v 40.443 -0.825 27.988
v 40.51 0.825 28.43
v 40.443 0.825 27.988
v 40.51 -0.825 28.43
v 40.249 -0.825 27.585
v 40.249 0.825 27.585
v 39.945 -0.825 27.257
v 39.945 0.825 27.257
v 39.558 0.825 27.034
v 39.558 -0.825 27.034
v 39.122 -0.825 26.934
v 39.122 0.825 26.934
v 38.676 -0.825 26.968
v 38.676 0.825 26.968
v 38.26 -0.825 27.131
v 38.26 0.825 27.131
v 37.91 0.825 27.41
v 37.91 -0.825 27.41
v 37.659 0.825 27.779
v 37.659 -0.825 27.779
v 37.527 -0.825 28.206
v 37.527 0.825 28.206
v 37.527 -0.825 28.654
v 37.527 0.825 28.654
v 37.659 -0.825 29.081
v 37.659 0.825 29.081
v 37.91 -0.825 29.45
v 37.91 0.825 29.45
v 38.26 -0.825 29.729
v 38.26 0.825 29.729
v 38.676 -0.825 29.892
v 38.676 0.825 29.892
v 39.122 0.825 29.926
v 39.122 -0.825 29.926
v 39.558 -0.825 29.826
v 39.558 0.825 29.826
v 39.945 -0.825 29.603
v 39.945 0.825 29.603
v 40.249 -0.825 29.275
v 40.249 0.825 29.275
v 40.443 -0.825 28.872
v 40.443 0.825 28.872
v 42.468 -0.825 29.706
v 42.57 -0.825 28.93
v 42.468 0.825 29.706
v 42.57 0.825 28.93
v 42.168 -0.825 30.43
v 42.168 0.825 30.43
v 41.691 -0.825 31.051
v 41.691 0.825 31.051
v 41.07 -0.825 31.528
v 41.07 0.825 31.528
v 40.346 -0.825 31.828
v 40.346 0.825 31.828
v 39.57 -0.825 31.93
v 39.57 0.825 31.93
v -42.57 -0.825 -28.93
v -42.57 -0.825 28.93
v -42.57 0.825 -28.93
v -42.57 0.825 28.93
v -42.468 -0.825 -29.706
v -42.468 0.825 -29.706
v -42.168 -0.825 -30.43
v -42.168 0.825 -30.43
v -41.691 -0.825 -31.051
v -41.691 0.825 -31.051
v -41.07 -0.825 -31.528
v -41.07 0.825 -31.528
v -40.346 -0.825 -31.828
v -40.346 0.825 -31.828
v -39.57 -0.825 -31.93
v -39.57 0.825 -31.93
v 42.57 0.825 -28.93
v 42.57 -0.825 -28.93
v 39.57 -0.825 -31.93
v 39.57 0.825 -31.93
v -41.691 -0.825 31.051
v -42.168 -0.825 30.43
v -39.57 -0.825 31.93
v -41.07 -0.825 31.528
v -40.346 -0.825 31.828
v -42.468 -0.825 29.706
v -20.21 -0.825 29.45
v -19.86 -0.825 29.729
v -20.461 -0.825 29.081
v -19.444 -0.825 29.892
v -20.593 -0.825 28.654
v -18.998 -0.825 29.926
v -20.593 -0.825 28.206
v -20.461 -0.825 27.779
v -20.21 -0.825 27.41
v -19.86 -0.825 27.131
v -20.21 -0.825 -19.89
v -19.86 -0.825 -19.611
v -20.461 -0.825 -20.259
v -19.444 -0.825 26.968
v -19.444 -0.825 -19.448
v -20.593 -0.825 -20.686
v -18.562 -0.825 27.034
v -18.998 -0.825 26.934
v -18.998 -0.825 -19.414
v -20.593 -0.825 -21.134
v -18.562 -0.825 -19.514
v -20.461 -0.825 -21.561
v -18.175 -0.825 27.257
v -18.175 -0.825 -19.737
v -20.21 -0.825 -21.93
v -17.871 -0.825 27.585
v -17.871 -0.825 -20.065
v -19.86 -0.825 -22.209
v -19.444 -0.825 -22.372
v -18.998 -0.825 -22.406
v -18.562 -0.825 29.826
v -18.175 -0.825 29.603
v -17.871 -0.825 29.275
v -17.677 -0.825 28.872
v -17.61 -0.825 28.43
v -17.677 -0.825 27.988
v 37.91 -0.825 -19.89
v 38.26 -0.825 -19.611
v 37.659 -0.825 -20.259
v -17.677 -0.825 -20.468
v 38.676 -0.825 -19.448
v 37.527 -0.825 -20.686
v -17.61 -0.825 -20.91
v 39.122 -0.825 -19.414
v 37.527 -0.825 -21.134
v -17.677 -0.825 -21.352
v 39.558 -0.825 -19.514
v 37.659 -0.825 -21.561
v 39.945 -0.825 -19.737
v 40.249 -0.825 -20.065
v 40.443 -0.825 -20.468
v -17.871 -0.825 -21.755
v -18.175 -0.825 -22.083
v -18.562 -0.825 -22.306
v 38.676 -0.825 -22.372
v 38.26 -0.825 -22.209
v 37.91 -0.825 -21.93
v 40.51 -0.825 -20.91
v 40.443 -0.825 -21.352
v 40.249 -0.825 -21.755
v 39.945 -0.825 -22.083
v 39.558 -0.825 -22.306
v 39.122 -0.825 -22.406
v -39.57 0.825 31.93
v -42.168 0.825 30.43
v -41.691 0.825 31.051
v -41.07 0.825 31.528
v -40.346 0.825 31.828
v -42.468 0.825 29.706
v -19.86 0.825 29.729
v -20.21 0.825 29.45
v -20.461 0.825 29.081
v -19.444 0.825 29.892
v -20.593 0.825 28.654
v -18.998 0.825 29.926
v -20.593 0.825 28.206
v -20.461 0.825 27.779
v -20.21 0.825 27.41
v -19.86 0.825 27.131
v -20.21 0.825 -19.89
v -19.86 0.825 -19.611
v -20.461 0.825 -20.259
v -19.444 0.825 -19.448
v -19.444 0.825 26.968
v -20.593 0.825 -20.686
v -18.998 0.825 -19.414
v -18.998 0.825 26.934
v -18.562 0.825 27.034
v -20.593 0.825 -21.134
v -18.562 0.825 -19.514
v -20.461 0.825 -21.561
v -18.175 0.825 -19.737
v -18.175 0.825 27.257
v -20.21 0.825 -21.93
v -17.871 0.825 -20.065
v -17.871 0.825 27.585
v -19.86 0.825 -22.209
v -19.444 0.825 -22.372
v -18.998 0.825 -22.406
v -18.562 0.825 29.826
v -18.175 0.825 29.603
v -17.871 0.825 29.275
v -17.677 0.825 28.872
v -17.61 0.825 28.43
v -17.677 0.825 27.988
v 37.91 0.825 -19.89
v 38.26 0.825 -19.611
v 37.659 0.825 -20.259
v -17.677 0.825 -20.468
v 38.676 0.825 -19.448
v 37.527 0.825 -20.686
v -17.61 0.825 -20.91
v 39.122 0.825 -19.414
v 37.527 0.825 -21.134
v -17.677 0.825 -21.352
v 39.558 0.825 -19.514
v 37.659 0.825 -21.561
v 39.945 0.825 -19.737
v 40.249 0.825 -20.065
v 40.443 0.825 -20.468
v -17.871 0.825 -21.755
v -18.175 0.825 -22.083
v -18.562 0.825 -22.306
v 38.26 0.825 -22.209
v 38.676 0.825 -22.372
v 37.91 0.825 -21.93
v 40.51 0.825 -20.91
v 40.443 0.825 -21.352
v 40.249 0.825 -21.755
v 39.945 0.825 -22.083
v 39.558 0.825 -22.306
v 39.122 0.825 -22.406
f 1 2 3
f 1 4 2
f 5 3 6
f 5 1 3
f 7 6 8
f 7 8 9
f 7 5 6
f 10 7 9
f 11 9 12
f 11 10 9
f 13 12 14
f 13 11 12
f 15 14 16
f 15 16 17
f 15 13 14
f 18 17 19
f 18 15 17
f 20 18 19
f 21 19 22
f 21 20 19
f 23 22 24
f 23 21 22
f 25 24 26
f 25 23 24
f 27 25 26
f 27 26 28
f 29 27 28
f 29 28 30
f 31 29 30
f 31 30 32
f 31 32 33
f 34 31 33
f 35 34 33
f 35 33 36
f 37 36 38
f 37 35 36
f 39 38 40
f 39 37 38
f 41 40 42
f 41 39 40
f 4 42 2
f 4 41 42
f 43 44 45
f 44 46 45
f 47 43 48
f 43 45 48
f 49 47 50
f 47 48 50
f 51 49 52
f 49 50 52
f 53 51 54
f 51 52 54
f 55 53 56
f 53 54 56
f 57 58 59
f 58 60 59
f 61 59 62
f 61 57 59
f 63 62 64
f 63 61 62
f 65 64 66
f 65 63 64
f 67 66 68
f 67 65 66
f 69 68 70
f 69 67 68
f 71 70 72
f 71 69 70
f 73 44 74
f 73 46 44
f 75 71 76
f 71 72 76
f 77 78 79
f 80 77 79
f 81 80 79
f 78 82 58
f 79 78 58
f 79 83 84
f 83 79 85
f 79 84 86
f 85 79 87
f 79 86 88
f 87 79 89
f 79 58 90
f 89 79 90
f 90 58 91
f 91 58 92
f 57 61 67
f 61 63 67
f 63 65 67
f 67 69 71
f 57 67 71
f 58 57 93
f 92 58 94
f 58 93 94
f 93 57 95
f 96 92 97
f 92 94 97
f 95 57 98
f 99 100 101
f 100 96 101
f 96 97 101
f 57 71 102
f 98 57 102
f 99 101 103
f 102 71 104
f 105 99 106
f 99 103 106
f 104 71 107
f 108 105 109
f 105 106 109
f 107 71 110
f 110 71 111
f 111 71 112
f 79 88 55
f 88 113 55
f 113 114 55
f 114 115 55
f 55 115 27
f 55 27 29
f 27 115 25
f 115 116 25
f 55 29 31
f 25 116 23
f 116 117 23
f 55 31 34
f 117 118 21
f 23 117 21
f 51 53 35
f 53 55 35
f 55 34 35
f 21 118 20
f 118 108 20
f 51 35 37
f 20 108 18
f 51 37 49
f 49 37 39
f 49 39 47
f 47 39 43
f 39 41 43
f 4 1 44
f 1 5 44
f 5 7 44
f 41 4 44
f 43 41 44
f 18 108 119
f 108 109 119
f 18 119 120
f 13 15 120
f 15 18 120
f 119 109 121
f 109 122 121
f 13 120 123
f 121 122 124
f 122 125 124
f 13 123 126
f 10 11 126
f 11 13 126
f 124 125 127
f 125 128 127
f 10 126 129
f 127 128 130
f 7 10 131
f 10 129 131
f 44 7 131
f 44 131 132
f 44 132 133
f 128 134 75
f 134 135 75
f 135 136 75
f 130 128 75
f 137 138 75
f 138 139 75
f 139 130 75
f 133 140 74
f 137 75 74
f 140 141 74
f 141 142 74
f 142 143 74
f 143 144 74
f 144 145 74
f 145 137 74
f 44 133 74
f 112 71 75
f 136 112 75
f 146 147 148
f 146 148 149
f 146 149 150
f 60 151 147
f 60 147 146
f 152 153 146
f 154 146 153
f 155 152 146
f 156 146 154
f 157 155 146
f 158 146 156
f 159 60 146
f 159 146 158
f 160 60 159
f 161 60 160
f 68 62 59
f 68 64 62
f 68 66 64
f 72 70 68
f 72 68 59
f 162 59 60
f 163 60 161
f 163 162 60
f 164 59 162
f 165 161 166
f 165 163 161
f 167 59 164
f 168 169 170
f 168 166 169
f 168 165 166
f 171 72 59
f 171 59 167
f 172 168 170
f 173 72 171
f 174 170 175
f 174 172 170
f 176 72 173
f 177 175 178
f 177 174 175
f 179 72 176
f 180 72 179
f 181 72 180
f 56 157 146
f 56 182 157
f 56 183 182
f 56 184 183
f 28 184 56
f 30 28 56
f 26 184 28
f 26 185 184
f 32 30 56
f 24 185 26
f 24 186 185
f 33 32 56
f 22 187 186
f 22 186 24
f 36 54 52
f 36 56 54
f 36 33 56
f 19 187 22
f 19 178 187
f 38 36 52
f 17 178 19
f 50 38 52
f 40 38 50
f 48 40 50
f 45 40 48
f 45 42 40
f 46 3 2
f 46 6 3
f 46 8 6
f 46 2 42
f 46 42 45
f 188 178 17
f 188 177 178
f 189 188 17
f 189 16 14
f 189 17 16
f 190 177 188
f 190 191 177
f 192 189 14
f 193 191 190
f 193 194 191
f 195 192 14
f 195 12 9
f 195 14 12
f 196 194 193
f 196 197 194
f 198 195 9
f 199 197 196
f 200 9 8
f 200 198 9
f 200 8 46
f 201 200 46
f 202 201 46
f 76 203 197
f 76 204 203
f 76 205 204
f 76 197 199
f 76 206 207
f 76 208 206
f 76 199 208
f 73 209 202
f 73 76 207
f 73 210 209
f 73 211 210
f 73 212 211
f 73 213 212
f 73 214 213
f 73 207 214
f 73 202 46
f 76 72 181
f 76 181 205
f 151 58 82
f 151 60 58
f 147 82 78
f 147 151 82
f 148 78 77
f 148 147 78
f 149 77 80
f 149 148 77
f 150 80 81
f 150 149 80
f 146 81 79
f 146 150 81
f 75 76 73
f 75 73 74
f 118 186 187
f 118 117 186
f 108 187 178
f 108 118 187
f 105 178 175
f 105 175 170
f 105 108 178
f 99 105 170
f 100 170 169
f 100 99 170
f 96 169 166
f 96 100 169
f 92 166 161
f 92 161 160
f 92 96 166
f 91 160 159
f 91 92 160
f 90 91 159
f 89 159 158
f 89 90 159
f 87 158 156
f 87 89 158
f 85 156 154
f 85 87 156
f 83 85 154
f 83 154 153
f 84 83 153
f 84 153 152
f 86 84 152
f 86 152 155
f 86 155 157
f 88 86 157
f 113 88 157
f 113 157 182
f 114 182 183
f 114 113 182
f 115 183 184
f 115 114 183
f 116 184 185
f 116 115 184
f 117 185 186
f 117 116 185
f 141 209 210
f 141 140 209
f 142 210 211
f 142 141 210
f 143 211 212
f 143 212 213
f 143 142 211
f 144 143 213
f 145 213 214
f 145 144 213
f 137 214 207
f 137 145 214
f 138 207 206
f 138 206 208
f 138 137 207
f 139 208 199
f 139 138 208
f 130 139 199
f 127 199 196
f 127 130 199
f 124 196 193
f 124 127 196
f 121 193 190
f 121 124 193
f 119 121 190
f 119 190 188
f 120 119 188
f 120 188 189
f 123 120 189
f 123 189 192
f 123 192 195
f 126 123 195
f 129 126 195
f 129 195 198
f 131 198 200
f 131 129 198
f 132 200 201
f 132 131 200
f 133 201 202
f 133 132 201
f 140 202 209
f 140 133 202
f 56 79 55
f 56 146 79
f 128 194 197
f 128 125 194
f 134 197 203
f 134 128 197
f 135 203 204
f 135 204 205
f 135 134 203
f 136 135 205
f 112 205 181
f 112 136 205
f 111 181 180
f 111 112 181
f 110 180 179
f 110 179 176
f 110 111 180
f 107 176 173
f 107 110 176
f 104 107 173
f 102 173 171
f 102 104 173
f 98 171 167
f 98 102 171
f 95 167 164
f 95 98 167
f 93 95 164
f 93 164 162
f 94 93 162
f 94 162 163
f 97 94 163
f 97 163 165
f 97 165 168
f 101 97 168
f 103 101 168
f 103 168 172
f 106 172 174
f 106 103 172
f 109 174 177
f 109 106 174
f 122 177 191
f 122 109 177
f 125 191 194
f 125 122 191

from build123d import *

# Parameters (mm, degrees)
SKETCH2_W           = 85.14
SKETCH2_H           = 63.86
SKETCH2_R           = 1.5
BOSS_EXTRUDE1_DEPTH = 0.825
FILLET1_R           = 3
CHAMFER1_SIZE       = 3


with BuildPart() as part:
    # Sketch2 → Boss-Extrude1 (new body, symmetric)
    with BuildSketch(Plane(origin=(0, 0, 0), x_dir=(1, 0, 0), z_dir=(0, 1, 0))):
        Rectangle(SKETCH2_W, SKETCH2_H)
        with Locations((-19.11, 20.91)):
            Circle(SKETCH2_R, mode=Mode.SUBTRACT)
        with Locations((39.01, 20.91)):
            Circle(SKETCH2_R, mode=Mode.SUBTRACT)
        with Locations((39.01, -28.43)):
            Circle(SKETCH2_R, mode=Mode.SUBTRACT)
        with Locations((-19.11, -28.43)):
            Circle(SKETCH2_R, mode=Mode.SUBTRACT)
    extrude(amount=BOSS_EXTRUDE1_DEPTH, both=True)

    # Fillet1
    fillet1_edges = [part.edges().sort_by_distance(p)[0] for p in [
        (42.57, 0, 31.93),
        (-42.57, 0, 31.93),
        (-42.57, 0, -31.93),
    ]]
    fillet(fillet1_edges, radius=FILLET1_R)

    # Chamfer1
    chamfer1_edges = [part.edges().sort_by_distance(p)[0] for p in [
        (42.57, 0, -31.93),
    ]]
    chamfer(chamfer1_edges, length=CHAMFER1_SIZE)


solid = part.part
